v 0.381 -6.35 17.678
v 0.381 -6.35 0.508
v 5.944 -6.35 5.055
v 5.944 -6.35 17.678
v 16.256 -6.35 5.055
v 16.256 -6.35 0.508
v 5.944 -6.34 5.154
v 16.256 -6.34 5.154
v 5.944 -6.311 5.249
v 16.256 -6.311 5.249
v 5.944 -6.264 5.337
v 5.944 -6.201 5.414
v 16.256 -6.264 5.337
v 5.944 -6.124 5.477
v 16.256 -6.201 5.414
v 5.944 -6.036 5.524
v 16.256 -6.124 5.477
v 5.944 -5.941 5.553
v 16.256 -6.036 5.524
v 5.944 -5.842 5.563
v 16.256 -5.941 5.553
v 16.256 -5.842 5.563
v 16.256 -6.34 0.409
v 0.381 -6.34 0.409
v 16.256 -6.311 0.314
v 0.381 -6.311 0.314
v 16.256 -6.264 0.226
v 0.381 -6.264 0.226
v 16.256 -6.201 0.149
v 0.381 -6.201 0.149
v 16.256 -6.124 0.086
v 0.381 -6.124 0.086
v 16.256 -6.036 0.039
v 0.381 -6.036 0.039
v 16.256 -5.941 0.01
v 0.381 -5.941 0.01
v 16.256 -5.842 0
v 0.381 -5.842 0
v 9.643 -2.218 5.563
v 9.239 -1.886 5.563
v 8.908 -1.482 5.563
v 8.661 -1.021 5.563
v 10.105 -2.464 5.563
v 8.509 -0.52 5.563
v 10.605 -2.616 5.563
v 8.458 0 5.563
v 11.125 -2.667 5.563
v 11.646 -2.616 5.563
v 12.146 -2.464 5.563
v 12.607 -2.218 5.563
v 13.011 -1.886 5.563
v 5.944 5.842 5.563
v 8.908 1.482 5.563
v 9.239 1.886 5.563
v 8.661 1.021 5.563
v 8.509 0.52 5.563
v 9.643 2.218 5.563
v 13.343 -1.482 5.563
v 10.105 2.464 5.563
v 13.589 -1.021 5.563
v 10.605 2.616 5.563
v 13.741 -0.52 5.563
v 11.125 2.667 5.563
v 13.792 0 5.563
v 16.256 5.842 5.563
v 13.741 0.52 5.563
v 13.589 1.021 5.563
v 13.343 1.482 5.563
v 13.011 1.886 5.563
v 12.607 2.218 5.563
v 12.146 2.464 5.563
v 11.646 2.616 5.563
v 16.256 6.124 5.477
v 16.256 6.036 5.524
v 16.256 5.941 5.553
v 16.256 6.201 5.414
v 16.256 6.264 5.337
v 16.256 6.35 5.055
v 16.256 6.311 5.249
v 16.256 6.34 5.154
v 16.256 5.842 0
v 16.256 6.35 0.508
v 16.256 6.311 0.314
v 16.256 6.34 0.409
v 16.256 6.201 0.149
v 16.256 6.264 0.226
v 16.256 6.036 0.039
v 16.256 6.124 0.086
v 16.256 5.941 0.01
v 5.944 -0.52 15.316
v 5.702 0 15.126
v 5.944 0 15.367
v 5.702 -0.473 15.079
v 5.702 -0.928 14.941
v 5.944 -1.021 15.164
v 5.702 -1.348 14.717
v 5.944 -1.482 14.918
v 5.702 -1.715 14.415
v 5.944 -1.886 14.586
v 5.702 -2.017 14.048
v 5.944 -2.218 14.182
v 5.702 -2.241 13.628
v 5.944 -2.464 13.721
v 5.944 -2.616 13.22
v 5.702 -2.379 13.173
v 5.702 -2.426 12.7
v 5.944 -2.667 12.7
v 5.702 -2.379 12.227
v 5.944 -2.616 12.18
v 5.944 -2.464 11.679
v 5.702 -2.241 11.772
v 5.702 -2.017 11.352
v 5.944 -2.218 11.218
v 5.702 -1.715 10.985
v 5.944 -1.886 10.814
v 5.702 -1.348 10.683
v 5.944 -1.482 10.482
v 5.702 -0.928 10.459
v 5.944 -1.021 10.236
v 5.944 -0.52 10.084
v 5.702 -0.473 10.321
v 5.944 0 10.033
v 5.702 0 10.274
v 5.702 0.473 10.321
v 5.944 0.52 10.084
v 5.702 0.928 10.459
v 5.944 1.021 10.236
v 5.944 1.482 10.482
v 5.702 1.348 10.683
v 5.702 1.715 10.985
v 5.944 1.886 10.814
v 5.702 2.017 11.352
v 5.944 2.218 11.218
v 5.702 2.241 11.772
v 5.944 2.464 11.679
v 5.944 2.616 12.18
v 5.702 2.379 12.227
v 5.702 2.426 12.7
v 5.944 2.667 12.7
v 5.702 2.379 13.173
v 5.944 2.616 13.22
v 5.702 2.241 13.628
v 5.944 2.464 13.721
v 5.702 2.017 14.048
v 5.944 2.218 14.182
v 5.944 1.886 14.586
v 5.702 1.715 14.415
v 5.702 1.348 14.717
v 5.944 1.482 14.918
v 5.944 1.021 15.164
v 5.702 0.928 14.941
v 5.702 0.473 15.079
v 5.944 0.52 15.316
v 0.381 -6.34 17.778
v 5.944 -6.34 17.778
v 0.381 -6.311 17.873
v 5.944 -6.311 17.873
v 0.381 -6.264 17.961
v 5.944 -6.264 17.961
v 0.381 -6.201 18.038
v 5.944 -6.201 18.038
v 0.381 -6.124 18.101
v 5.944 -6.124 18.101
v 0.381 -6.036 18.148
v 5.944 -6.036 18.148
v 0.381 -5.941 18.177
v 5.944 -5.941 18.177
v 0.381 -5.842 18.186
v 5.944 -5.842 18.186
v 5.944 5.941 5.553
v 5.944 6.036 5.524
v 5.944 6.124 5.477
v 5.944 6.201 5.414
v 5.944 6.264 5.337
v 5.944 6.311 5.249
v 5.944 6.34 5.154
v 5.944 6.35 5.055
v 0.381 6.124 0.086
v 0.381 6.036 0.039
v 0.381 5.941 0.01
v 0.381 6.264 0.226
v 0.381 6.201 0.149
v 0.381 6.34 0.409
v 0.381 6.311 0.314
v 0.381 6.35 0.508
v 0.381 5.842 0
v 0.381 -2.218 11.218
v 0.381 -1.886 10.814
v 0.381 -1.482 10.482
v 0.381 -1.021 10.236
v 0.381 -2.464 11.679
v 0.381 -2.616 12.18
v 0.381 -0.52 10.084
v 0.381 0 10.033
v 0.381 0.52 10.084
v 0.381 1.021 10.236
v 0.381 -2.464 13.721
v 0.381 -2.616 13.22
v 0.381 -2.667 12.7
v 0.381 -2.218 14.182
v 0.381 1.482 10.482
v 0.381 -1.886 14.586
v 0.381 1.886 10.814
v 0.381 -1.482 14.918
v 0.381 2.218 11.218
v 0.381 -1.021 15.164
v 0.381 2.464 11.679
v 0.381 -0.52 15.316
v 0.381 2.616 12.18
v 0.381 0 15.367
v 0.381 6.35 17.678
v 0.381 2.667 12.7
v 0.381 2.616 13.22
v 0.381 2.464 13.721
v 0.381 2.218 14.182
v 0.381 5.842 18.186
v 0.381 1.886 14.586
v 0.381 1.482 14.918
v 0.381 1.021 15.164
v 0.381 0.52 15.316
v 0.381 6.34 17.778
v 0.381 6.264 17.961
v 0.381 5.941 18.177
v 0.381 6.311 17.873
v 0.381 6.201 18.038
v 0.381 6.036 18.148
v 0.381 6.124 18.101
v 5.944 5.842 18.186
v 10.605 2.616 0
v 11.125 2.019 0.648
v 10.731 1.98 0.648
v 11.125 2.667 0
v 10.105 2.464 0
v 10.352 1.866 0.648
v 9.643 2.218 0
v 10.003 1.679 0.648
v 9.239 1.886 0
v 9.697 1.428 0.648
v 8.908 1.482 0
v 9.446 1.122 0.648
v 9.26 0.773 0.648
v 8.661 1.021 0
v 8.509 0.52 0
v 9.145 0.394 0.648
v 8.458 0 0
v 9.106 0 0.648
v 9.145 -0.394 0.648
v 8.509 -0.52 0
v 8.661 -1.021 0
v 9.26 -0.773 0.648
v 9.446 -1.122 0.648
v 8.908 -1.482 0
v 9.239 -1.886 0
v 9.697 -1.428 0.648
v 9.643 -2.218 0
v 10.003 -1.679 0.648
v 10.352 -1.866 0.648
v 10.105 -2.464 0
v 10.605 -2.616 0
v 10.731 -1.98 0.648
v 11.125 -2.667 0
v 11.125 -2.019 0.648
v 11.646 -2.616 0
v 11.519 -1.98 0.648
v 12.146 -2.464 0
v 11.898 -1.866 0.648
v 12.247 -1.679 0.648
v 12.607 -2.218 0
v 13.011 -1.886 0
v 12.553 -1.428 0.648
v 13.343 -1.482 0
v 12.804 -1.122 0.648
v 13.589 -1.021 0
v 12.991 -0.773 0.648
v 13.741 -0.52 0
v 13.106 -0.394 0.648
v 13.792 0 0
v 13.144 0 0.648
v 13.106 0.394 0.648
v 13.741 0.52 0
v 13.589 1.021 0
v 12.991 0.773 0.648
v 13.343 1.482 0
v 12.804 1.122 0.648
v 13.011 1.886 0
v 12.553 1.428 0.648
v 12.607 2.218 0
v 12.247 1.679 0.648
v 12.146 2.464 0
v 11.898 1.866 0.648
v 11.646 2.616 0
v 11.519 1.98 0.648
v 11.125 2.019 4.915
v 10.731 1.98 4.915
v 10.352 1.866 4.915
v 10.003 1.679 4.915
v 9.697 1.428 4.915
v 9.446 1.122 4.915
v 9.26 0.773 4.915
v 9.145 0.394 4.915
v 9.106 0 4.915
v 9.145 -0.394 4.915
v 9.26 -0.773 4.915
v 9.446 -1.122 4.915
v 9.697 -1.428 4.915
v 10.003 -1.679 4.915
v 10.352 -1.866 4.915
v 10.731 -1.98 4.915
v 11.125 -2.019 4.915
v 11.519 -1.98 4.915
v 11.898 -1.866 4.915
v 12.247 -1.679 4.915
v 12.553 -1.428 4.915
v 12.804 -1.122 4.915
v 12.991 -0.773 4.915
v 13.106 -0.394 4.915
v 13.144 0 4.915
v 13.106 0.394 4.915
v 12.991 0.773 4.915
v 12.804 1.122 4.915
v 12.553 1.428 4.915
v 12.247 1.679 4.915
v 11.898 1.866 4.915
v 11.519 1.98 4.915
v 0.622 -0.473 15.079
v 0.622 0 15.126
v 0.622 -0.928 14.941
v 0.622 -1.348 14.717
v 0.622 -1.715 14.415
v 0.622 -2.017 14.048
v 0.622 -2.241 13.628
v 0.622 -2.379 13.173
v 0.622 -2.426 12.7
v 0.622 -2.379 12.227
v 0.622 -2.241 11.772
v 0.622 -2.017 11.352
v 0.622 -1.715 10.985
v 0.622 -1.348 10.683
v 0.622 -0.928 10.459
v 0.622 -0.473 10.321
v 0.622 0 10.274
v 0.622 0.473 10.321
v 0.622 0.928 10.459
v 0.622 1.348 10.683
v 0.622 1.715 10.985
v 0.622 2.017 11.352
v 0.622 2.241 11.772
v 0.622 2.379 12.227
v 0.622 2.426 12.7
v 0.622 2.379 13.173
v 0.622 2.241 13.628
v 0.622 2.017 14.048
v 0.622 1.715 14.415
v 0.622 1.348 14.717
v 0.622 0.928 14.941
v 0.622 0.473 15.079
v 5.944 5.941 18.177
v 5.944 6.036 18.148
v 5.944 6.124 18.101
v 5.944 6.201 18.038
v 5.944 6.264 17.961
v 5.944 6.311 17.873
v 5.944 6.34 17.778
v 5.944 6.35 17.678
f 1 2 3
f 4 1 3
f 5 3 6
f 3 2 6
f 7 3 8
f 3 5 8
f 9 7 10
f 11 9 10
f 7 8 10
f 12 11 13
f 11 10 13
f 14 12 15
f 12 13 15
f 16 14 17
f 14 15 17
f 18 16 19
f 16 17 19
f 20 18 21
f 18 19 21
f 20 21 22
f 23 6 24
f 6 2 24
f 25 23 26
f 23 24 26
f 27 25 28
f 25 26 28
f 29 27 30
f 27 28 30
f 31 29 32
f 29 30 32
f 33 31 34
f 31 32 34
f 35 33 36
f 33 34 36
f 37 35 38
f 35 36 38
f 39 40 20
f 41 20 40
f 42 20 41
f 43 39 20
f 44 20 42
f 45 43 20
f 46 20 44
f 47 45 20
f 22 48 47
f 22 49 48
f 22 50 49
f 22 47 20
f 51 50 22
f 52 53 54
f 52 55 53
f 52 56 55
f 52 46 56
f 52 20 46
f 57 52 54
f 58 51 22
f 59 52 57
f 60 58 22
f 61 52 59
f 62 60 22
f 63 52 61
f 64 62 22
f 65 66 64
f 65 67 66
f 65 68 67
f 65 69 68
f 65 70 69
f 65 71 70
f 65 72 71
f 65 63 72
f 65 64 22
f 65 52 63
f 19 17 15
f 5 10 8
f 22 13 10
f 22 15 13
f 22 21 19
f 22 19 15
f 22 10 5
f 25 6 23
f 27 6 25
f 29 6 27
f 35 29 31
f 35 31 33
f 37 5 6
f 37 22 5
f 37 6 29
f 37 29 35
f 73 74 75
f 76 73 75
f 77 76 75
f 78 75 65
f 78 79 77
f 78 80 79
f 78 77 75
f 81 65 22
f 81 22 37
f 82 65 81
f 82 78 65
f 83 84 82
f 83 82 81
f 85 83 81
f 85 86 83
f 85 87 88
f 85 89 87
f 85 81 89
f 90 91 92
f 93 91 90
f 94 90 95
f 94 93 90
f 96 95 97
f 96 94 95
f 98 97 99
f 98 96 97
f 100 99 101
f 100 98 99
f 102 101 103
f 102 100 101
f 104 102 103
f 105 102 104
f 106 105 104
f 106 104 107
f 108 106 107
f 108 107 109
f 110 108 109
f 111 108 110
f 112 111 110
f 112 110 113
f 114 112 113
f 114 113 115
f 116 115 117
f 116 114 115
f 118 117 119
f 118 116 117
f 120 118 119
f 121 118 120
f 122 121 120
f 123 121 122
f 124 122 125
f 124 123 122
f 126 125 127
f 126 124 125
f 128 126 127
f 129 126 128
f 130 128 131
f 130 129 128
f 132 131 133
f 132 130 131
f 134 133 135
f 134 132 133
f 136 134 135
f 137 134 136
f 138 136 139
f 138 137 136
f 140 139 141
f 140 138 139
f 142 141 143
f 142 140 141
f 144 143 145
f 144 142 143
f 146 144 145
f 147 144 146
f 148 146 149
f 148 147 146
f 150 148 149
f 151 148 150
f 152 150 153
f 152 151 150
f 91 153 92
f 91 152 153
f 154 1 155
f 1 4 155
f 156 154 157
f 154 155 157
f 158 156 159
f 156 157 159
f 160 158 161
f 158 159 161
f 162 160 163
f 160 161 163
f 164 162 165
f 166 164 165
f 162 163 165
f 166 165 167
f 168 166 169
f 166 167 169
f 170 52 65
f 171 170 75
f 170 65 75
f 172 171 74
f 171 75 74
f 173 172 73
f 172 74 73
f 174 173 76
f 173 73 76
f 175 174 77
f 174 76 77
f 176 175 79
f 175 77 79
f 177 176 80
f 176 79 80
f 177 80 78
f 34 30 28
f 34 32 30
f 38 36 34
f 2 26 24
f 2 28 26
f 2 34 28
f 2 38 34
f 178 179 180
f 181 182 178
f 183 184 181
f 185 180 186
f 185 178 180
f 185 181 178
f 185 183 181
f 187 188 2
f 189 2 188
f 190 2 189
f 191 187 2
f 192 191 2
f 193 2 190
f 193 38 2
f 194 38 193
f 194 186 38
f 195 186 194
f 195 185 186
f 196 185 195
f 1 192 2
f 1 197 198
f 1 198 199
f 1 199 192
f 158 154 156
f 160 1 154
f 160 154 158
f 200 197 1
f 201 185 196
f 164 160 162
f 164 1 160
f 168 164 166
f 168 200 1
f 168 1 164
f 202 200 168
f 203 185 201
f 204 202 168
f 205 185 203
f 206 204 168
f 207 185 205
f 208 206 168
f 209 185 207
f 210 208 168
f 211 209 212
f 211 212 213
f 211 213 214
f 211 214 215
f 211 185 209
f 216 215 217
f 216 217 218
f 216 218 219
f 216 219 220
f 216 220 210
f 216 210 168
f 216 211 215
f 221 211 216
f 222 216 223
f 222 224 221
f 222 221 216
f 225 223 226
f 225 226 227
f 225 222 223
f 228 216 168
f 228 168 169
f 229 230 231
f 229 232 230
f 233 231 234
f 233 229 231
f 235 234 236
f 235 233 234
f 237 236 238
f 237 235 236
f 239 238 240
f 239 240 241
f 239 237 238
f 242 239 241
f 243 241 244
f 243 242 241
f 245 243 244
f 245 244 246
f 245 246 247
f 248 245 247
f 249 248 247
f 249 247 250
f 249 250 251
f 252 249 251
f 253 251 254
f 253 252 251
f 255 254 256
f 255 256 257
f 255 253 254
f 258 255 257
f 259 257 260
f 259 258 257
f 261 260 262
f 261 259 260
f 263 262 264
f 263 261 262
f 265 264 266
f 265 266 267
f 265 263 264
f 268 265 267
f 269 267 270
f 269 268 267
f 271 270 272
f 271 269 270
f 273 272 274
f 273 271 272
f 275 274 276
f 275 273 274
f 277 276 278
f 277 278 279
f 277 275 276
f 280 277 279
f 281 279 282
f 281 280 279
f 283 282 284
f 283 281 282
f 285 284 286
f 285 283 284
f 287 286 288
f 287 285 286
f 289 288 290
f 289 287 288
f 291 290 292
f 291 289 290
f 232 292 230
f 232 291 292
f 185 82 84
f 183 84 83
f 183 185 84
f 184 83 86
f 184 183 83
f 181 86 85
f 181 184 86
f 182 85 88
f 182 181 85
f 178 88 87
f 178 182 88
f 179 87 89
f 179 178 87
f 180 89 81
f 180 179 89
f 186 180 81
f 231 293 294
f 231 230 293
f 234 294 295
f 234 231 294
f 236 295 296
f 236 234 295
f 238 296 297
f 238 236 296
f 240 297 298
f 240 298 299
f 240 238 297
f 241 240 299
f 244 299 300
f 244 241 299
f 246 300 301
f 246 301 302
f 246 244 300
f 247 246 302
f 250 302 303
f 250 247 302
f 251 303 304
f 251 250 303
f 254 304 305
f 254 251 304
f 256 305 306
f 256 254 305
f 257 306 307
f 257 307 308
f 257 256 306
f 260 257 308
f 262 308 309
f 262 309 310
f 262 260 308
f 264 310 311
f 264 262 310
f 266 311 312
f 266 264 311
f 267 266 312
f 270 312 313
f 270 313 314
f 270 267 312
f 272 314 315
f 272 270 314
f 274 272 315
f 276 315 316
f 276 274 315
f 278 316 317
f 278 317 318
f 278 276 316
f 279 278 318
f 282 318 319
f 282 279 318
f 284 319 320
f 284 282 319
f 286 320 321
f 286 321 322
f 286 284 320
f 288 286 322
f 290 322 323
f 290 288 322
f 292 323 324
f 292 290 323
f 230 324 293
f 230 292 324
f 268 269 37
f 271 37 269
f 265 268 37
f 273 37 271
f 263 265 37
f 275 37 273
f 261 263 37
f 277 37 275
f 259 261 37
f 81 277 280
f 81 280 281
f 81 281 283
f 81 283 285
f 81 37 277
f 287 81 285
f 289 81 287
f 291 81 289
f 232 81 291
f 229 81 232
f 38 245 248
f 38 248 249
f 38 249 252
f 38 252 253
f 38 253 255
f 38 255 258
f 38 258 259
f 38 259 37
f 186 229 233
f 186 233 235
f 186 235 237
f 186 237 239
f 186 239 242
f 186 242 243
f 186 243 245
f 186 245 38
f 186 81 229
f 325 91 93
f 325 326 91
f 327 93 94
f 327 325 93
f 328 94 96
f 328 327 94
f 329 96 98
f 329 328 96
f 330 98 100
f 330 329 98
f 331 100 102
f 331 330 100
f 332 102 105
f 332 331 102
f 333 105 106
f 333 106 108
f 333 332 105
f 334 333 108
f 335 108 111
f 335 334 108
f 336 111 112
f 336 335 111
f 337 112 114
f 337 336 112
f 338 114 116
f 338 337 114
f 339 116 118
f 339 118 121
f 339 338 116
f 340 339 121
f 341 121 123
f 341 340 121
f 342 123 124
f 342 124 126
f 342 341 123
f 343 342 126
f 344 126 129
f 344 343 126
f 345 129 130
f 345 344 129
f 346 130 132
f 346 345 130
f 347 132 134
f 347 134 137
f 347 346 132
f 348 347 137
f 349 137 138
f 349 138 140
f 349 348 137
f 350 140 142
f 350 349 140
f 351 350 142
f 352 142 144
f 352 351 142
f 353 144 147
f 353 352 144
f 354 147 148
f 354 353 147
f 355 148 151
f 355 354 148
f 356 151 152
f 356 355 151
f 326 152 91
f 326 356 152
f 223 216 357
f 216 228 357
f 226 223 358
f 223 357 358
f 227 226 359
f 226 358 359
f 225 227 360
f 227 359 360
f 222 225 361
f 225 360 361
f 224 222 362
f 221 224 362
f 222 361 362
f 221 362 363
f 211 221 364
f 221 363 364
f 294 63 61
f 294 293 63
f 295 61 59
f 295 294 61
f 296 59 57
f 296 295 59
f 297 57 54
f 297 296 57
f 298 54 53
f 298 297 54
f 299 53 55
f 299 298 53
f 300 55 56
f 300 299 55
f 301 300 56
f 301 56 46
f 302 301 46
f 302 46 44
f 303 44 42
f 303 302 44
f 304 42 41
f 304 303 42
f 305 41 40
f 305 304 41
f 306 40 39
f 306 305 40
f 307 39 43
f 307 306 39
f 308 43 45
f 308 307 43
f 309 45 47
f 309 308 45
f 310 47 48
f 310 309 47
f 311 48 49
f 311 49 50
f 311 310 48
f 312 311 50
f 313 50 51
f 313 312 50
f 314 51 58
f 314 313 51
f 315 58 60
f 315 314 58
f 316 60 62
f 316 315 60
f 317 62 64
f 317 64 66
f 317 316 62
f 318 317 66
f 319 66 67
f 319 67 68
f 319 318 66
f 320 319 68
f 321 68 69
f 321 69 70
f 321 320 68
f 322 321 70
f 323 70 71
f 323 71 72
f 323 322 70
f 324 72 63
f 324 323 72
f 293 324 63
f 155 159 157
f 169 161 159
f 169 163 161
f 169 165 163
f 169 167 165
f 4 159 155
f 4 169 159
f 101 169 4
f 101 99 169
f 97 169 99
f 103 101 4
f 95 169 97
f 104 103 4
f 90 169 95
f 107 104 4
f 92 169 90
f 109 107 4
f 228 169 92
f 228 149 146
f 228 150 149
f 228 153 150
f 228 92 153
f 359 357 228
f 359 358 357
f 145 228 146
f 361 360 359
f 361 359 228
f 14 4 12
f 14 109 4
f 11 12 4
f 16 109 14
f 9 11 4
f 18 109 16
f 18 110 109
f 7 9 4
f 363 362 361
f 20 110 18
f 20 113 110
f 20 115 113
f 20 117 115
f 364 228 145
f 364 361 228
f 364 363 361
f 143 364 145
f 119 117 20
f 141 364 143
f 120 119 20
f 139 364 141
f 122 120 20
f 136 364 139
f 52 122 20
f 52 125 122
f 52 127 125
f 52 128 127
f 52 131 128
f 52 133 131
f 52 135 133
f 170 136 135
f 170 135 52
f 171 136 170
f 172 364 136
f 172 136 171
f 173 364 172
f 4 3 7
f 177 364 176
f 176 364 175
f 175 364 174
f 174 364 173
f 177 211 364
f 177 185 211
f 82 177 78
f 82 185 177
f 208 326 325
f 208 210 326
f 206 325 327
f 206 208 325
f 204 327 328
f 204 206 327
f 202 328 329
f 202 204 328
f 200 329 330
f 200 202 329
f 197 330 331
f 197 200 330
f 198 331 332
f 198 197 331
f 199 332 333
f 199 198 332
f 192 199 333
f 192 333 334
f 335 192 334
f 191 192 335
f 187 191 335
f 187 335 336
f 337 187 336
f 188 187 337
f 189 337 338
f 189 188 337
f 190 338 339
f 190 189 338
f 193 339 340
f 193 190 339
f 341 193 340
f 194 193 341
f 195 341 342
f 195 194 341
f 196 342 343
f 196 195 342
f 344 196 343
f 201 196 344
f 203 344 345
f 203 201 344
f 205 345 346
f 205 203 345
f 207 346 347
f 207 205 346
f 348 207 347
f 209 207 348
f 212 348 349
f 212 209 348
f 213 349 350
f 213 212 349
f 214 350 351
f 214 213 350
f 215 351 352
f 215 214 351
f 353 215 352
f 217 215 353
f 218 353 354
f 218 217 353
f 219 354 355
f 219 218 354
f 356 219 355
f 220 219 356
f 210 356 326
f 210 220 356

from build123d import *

# Parameters (mm, degrees)
EXTRUDE1_DEPTH = 6.35
FILLET1_R      = 0.508


with BuildPart() as part:
    # Sketch1 → Extrude1 (new, symmetric)
    with BuildSketch(Plane(origin=(0, 0, 0), x_dir=(1, 0, 0), z_dir=(0, 1, 0))):
        Polygon((5.9436, -18.1864), (5.9436, -5.5626), (16.256, -5.5626), (16.256, 0), (0.381, 0), (0.381, -18.1864), align=None)
    extrude(amount=EXTRUDE1_DEPTH, both=True)

    # Sketch2 → #11 (0.191) Diameter Hole1 (revolve, cut)
    with BuildSketch(Plane(origin=(0.381, 0, 12.7), x_dir=(0, 0, 1), z_dir=(0, 1, 0))):
        Polygon((0, 0), (0, 5.5626), (2.667, 5.5626), (2.4257, 5.3213), (2.4257, 0.2413), (2.667, 0), align=None)
    revolve(axis=Axis((-5.969, 0, 12.7), (1, 0, 0)), mode=Mode.SUBTRACT)

    # Sketch4 → #10-32 Tapped Hole1 (revolve, cut)
    with BuildSketch(Plane.YZ.offset(11.1252)):
        Polygon((0, 0), (0, 5.5626), (2.667, 5.5626), (2.0193, 4.9149), (2.0193, 0.6477), (2.667, 0), align=None)
    revolve(axis=Axis((11.1252, 0, -6.35), (0, 0, 1)), mode=Mode.SUBTRACT)

    # Fillet1
    fillet1_edges = [part.edges().sort_by_distance(p)[0] for p in [
        (11.0998, 6.35, 5.5626),
        (8.3185, 6.35, 0),
        (8.3185, -6.35, 0),
        (11.0998, -6.35, 5.5626),
        (3.1623, 6.35, 18.1864),
        (3.1623, -6.35, 18.1864),
    ]]
    fillet(fillet1_edges, radius=FILLET1_R)


solid = part.part
